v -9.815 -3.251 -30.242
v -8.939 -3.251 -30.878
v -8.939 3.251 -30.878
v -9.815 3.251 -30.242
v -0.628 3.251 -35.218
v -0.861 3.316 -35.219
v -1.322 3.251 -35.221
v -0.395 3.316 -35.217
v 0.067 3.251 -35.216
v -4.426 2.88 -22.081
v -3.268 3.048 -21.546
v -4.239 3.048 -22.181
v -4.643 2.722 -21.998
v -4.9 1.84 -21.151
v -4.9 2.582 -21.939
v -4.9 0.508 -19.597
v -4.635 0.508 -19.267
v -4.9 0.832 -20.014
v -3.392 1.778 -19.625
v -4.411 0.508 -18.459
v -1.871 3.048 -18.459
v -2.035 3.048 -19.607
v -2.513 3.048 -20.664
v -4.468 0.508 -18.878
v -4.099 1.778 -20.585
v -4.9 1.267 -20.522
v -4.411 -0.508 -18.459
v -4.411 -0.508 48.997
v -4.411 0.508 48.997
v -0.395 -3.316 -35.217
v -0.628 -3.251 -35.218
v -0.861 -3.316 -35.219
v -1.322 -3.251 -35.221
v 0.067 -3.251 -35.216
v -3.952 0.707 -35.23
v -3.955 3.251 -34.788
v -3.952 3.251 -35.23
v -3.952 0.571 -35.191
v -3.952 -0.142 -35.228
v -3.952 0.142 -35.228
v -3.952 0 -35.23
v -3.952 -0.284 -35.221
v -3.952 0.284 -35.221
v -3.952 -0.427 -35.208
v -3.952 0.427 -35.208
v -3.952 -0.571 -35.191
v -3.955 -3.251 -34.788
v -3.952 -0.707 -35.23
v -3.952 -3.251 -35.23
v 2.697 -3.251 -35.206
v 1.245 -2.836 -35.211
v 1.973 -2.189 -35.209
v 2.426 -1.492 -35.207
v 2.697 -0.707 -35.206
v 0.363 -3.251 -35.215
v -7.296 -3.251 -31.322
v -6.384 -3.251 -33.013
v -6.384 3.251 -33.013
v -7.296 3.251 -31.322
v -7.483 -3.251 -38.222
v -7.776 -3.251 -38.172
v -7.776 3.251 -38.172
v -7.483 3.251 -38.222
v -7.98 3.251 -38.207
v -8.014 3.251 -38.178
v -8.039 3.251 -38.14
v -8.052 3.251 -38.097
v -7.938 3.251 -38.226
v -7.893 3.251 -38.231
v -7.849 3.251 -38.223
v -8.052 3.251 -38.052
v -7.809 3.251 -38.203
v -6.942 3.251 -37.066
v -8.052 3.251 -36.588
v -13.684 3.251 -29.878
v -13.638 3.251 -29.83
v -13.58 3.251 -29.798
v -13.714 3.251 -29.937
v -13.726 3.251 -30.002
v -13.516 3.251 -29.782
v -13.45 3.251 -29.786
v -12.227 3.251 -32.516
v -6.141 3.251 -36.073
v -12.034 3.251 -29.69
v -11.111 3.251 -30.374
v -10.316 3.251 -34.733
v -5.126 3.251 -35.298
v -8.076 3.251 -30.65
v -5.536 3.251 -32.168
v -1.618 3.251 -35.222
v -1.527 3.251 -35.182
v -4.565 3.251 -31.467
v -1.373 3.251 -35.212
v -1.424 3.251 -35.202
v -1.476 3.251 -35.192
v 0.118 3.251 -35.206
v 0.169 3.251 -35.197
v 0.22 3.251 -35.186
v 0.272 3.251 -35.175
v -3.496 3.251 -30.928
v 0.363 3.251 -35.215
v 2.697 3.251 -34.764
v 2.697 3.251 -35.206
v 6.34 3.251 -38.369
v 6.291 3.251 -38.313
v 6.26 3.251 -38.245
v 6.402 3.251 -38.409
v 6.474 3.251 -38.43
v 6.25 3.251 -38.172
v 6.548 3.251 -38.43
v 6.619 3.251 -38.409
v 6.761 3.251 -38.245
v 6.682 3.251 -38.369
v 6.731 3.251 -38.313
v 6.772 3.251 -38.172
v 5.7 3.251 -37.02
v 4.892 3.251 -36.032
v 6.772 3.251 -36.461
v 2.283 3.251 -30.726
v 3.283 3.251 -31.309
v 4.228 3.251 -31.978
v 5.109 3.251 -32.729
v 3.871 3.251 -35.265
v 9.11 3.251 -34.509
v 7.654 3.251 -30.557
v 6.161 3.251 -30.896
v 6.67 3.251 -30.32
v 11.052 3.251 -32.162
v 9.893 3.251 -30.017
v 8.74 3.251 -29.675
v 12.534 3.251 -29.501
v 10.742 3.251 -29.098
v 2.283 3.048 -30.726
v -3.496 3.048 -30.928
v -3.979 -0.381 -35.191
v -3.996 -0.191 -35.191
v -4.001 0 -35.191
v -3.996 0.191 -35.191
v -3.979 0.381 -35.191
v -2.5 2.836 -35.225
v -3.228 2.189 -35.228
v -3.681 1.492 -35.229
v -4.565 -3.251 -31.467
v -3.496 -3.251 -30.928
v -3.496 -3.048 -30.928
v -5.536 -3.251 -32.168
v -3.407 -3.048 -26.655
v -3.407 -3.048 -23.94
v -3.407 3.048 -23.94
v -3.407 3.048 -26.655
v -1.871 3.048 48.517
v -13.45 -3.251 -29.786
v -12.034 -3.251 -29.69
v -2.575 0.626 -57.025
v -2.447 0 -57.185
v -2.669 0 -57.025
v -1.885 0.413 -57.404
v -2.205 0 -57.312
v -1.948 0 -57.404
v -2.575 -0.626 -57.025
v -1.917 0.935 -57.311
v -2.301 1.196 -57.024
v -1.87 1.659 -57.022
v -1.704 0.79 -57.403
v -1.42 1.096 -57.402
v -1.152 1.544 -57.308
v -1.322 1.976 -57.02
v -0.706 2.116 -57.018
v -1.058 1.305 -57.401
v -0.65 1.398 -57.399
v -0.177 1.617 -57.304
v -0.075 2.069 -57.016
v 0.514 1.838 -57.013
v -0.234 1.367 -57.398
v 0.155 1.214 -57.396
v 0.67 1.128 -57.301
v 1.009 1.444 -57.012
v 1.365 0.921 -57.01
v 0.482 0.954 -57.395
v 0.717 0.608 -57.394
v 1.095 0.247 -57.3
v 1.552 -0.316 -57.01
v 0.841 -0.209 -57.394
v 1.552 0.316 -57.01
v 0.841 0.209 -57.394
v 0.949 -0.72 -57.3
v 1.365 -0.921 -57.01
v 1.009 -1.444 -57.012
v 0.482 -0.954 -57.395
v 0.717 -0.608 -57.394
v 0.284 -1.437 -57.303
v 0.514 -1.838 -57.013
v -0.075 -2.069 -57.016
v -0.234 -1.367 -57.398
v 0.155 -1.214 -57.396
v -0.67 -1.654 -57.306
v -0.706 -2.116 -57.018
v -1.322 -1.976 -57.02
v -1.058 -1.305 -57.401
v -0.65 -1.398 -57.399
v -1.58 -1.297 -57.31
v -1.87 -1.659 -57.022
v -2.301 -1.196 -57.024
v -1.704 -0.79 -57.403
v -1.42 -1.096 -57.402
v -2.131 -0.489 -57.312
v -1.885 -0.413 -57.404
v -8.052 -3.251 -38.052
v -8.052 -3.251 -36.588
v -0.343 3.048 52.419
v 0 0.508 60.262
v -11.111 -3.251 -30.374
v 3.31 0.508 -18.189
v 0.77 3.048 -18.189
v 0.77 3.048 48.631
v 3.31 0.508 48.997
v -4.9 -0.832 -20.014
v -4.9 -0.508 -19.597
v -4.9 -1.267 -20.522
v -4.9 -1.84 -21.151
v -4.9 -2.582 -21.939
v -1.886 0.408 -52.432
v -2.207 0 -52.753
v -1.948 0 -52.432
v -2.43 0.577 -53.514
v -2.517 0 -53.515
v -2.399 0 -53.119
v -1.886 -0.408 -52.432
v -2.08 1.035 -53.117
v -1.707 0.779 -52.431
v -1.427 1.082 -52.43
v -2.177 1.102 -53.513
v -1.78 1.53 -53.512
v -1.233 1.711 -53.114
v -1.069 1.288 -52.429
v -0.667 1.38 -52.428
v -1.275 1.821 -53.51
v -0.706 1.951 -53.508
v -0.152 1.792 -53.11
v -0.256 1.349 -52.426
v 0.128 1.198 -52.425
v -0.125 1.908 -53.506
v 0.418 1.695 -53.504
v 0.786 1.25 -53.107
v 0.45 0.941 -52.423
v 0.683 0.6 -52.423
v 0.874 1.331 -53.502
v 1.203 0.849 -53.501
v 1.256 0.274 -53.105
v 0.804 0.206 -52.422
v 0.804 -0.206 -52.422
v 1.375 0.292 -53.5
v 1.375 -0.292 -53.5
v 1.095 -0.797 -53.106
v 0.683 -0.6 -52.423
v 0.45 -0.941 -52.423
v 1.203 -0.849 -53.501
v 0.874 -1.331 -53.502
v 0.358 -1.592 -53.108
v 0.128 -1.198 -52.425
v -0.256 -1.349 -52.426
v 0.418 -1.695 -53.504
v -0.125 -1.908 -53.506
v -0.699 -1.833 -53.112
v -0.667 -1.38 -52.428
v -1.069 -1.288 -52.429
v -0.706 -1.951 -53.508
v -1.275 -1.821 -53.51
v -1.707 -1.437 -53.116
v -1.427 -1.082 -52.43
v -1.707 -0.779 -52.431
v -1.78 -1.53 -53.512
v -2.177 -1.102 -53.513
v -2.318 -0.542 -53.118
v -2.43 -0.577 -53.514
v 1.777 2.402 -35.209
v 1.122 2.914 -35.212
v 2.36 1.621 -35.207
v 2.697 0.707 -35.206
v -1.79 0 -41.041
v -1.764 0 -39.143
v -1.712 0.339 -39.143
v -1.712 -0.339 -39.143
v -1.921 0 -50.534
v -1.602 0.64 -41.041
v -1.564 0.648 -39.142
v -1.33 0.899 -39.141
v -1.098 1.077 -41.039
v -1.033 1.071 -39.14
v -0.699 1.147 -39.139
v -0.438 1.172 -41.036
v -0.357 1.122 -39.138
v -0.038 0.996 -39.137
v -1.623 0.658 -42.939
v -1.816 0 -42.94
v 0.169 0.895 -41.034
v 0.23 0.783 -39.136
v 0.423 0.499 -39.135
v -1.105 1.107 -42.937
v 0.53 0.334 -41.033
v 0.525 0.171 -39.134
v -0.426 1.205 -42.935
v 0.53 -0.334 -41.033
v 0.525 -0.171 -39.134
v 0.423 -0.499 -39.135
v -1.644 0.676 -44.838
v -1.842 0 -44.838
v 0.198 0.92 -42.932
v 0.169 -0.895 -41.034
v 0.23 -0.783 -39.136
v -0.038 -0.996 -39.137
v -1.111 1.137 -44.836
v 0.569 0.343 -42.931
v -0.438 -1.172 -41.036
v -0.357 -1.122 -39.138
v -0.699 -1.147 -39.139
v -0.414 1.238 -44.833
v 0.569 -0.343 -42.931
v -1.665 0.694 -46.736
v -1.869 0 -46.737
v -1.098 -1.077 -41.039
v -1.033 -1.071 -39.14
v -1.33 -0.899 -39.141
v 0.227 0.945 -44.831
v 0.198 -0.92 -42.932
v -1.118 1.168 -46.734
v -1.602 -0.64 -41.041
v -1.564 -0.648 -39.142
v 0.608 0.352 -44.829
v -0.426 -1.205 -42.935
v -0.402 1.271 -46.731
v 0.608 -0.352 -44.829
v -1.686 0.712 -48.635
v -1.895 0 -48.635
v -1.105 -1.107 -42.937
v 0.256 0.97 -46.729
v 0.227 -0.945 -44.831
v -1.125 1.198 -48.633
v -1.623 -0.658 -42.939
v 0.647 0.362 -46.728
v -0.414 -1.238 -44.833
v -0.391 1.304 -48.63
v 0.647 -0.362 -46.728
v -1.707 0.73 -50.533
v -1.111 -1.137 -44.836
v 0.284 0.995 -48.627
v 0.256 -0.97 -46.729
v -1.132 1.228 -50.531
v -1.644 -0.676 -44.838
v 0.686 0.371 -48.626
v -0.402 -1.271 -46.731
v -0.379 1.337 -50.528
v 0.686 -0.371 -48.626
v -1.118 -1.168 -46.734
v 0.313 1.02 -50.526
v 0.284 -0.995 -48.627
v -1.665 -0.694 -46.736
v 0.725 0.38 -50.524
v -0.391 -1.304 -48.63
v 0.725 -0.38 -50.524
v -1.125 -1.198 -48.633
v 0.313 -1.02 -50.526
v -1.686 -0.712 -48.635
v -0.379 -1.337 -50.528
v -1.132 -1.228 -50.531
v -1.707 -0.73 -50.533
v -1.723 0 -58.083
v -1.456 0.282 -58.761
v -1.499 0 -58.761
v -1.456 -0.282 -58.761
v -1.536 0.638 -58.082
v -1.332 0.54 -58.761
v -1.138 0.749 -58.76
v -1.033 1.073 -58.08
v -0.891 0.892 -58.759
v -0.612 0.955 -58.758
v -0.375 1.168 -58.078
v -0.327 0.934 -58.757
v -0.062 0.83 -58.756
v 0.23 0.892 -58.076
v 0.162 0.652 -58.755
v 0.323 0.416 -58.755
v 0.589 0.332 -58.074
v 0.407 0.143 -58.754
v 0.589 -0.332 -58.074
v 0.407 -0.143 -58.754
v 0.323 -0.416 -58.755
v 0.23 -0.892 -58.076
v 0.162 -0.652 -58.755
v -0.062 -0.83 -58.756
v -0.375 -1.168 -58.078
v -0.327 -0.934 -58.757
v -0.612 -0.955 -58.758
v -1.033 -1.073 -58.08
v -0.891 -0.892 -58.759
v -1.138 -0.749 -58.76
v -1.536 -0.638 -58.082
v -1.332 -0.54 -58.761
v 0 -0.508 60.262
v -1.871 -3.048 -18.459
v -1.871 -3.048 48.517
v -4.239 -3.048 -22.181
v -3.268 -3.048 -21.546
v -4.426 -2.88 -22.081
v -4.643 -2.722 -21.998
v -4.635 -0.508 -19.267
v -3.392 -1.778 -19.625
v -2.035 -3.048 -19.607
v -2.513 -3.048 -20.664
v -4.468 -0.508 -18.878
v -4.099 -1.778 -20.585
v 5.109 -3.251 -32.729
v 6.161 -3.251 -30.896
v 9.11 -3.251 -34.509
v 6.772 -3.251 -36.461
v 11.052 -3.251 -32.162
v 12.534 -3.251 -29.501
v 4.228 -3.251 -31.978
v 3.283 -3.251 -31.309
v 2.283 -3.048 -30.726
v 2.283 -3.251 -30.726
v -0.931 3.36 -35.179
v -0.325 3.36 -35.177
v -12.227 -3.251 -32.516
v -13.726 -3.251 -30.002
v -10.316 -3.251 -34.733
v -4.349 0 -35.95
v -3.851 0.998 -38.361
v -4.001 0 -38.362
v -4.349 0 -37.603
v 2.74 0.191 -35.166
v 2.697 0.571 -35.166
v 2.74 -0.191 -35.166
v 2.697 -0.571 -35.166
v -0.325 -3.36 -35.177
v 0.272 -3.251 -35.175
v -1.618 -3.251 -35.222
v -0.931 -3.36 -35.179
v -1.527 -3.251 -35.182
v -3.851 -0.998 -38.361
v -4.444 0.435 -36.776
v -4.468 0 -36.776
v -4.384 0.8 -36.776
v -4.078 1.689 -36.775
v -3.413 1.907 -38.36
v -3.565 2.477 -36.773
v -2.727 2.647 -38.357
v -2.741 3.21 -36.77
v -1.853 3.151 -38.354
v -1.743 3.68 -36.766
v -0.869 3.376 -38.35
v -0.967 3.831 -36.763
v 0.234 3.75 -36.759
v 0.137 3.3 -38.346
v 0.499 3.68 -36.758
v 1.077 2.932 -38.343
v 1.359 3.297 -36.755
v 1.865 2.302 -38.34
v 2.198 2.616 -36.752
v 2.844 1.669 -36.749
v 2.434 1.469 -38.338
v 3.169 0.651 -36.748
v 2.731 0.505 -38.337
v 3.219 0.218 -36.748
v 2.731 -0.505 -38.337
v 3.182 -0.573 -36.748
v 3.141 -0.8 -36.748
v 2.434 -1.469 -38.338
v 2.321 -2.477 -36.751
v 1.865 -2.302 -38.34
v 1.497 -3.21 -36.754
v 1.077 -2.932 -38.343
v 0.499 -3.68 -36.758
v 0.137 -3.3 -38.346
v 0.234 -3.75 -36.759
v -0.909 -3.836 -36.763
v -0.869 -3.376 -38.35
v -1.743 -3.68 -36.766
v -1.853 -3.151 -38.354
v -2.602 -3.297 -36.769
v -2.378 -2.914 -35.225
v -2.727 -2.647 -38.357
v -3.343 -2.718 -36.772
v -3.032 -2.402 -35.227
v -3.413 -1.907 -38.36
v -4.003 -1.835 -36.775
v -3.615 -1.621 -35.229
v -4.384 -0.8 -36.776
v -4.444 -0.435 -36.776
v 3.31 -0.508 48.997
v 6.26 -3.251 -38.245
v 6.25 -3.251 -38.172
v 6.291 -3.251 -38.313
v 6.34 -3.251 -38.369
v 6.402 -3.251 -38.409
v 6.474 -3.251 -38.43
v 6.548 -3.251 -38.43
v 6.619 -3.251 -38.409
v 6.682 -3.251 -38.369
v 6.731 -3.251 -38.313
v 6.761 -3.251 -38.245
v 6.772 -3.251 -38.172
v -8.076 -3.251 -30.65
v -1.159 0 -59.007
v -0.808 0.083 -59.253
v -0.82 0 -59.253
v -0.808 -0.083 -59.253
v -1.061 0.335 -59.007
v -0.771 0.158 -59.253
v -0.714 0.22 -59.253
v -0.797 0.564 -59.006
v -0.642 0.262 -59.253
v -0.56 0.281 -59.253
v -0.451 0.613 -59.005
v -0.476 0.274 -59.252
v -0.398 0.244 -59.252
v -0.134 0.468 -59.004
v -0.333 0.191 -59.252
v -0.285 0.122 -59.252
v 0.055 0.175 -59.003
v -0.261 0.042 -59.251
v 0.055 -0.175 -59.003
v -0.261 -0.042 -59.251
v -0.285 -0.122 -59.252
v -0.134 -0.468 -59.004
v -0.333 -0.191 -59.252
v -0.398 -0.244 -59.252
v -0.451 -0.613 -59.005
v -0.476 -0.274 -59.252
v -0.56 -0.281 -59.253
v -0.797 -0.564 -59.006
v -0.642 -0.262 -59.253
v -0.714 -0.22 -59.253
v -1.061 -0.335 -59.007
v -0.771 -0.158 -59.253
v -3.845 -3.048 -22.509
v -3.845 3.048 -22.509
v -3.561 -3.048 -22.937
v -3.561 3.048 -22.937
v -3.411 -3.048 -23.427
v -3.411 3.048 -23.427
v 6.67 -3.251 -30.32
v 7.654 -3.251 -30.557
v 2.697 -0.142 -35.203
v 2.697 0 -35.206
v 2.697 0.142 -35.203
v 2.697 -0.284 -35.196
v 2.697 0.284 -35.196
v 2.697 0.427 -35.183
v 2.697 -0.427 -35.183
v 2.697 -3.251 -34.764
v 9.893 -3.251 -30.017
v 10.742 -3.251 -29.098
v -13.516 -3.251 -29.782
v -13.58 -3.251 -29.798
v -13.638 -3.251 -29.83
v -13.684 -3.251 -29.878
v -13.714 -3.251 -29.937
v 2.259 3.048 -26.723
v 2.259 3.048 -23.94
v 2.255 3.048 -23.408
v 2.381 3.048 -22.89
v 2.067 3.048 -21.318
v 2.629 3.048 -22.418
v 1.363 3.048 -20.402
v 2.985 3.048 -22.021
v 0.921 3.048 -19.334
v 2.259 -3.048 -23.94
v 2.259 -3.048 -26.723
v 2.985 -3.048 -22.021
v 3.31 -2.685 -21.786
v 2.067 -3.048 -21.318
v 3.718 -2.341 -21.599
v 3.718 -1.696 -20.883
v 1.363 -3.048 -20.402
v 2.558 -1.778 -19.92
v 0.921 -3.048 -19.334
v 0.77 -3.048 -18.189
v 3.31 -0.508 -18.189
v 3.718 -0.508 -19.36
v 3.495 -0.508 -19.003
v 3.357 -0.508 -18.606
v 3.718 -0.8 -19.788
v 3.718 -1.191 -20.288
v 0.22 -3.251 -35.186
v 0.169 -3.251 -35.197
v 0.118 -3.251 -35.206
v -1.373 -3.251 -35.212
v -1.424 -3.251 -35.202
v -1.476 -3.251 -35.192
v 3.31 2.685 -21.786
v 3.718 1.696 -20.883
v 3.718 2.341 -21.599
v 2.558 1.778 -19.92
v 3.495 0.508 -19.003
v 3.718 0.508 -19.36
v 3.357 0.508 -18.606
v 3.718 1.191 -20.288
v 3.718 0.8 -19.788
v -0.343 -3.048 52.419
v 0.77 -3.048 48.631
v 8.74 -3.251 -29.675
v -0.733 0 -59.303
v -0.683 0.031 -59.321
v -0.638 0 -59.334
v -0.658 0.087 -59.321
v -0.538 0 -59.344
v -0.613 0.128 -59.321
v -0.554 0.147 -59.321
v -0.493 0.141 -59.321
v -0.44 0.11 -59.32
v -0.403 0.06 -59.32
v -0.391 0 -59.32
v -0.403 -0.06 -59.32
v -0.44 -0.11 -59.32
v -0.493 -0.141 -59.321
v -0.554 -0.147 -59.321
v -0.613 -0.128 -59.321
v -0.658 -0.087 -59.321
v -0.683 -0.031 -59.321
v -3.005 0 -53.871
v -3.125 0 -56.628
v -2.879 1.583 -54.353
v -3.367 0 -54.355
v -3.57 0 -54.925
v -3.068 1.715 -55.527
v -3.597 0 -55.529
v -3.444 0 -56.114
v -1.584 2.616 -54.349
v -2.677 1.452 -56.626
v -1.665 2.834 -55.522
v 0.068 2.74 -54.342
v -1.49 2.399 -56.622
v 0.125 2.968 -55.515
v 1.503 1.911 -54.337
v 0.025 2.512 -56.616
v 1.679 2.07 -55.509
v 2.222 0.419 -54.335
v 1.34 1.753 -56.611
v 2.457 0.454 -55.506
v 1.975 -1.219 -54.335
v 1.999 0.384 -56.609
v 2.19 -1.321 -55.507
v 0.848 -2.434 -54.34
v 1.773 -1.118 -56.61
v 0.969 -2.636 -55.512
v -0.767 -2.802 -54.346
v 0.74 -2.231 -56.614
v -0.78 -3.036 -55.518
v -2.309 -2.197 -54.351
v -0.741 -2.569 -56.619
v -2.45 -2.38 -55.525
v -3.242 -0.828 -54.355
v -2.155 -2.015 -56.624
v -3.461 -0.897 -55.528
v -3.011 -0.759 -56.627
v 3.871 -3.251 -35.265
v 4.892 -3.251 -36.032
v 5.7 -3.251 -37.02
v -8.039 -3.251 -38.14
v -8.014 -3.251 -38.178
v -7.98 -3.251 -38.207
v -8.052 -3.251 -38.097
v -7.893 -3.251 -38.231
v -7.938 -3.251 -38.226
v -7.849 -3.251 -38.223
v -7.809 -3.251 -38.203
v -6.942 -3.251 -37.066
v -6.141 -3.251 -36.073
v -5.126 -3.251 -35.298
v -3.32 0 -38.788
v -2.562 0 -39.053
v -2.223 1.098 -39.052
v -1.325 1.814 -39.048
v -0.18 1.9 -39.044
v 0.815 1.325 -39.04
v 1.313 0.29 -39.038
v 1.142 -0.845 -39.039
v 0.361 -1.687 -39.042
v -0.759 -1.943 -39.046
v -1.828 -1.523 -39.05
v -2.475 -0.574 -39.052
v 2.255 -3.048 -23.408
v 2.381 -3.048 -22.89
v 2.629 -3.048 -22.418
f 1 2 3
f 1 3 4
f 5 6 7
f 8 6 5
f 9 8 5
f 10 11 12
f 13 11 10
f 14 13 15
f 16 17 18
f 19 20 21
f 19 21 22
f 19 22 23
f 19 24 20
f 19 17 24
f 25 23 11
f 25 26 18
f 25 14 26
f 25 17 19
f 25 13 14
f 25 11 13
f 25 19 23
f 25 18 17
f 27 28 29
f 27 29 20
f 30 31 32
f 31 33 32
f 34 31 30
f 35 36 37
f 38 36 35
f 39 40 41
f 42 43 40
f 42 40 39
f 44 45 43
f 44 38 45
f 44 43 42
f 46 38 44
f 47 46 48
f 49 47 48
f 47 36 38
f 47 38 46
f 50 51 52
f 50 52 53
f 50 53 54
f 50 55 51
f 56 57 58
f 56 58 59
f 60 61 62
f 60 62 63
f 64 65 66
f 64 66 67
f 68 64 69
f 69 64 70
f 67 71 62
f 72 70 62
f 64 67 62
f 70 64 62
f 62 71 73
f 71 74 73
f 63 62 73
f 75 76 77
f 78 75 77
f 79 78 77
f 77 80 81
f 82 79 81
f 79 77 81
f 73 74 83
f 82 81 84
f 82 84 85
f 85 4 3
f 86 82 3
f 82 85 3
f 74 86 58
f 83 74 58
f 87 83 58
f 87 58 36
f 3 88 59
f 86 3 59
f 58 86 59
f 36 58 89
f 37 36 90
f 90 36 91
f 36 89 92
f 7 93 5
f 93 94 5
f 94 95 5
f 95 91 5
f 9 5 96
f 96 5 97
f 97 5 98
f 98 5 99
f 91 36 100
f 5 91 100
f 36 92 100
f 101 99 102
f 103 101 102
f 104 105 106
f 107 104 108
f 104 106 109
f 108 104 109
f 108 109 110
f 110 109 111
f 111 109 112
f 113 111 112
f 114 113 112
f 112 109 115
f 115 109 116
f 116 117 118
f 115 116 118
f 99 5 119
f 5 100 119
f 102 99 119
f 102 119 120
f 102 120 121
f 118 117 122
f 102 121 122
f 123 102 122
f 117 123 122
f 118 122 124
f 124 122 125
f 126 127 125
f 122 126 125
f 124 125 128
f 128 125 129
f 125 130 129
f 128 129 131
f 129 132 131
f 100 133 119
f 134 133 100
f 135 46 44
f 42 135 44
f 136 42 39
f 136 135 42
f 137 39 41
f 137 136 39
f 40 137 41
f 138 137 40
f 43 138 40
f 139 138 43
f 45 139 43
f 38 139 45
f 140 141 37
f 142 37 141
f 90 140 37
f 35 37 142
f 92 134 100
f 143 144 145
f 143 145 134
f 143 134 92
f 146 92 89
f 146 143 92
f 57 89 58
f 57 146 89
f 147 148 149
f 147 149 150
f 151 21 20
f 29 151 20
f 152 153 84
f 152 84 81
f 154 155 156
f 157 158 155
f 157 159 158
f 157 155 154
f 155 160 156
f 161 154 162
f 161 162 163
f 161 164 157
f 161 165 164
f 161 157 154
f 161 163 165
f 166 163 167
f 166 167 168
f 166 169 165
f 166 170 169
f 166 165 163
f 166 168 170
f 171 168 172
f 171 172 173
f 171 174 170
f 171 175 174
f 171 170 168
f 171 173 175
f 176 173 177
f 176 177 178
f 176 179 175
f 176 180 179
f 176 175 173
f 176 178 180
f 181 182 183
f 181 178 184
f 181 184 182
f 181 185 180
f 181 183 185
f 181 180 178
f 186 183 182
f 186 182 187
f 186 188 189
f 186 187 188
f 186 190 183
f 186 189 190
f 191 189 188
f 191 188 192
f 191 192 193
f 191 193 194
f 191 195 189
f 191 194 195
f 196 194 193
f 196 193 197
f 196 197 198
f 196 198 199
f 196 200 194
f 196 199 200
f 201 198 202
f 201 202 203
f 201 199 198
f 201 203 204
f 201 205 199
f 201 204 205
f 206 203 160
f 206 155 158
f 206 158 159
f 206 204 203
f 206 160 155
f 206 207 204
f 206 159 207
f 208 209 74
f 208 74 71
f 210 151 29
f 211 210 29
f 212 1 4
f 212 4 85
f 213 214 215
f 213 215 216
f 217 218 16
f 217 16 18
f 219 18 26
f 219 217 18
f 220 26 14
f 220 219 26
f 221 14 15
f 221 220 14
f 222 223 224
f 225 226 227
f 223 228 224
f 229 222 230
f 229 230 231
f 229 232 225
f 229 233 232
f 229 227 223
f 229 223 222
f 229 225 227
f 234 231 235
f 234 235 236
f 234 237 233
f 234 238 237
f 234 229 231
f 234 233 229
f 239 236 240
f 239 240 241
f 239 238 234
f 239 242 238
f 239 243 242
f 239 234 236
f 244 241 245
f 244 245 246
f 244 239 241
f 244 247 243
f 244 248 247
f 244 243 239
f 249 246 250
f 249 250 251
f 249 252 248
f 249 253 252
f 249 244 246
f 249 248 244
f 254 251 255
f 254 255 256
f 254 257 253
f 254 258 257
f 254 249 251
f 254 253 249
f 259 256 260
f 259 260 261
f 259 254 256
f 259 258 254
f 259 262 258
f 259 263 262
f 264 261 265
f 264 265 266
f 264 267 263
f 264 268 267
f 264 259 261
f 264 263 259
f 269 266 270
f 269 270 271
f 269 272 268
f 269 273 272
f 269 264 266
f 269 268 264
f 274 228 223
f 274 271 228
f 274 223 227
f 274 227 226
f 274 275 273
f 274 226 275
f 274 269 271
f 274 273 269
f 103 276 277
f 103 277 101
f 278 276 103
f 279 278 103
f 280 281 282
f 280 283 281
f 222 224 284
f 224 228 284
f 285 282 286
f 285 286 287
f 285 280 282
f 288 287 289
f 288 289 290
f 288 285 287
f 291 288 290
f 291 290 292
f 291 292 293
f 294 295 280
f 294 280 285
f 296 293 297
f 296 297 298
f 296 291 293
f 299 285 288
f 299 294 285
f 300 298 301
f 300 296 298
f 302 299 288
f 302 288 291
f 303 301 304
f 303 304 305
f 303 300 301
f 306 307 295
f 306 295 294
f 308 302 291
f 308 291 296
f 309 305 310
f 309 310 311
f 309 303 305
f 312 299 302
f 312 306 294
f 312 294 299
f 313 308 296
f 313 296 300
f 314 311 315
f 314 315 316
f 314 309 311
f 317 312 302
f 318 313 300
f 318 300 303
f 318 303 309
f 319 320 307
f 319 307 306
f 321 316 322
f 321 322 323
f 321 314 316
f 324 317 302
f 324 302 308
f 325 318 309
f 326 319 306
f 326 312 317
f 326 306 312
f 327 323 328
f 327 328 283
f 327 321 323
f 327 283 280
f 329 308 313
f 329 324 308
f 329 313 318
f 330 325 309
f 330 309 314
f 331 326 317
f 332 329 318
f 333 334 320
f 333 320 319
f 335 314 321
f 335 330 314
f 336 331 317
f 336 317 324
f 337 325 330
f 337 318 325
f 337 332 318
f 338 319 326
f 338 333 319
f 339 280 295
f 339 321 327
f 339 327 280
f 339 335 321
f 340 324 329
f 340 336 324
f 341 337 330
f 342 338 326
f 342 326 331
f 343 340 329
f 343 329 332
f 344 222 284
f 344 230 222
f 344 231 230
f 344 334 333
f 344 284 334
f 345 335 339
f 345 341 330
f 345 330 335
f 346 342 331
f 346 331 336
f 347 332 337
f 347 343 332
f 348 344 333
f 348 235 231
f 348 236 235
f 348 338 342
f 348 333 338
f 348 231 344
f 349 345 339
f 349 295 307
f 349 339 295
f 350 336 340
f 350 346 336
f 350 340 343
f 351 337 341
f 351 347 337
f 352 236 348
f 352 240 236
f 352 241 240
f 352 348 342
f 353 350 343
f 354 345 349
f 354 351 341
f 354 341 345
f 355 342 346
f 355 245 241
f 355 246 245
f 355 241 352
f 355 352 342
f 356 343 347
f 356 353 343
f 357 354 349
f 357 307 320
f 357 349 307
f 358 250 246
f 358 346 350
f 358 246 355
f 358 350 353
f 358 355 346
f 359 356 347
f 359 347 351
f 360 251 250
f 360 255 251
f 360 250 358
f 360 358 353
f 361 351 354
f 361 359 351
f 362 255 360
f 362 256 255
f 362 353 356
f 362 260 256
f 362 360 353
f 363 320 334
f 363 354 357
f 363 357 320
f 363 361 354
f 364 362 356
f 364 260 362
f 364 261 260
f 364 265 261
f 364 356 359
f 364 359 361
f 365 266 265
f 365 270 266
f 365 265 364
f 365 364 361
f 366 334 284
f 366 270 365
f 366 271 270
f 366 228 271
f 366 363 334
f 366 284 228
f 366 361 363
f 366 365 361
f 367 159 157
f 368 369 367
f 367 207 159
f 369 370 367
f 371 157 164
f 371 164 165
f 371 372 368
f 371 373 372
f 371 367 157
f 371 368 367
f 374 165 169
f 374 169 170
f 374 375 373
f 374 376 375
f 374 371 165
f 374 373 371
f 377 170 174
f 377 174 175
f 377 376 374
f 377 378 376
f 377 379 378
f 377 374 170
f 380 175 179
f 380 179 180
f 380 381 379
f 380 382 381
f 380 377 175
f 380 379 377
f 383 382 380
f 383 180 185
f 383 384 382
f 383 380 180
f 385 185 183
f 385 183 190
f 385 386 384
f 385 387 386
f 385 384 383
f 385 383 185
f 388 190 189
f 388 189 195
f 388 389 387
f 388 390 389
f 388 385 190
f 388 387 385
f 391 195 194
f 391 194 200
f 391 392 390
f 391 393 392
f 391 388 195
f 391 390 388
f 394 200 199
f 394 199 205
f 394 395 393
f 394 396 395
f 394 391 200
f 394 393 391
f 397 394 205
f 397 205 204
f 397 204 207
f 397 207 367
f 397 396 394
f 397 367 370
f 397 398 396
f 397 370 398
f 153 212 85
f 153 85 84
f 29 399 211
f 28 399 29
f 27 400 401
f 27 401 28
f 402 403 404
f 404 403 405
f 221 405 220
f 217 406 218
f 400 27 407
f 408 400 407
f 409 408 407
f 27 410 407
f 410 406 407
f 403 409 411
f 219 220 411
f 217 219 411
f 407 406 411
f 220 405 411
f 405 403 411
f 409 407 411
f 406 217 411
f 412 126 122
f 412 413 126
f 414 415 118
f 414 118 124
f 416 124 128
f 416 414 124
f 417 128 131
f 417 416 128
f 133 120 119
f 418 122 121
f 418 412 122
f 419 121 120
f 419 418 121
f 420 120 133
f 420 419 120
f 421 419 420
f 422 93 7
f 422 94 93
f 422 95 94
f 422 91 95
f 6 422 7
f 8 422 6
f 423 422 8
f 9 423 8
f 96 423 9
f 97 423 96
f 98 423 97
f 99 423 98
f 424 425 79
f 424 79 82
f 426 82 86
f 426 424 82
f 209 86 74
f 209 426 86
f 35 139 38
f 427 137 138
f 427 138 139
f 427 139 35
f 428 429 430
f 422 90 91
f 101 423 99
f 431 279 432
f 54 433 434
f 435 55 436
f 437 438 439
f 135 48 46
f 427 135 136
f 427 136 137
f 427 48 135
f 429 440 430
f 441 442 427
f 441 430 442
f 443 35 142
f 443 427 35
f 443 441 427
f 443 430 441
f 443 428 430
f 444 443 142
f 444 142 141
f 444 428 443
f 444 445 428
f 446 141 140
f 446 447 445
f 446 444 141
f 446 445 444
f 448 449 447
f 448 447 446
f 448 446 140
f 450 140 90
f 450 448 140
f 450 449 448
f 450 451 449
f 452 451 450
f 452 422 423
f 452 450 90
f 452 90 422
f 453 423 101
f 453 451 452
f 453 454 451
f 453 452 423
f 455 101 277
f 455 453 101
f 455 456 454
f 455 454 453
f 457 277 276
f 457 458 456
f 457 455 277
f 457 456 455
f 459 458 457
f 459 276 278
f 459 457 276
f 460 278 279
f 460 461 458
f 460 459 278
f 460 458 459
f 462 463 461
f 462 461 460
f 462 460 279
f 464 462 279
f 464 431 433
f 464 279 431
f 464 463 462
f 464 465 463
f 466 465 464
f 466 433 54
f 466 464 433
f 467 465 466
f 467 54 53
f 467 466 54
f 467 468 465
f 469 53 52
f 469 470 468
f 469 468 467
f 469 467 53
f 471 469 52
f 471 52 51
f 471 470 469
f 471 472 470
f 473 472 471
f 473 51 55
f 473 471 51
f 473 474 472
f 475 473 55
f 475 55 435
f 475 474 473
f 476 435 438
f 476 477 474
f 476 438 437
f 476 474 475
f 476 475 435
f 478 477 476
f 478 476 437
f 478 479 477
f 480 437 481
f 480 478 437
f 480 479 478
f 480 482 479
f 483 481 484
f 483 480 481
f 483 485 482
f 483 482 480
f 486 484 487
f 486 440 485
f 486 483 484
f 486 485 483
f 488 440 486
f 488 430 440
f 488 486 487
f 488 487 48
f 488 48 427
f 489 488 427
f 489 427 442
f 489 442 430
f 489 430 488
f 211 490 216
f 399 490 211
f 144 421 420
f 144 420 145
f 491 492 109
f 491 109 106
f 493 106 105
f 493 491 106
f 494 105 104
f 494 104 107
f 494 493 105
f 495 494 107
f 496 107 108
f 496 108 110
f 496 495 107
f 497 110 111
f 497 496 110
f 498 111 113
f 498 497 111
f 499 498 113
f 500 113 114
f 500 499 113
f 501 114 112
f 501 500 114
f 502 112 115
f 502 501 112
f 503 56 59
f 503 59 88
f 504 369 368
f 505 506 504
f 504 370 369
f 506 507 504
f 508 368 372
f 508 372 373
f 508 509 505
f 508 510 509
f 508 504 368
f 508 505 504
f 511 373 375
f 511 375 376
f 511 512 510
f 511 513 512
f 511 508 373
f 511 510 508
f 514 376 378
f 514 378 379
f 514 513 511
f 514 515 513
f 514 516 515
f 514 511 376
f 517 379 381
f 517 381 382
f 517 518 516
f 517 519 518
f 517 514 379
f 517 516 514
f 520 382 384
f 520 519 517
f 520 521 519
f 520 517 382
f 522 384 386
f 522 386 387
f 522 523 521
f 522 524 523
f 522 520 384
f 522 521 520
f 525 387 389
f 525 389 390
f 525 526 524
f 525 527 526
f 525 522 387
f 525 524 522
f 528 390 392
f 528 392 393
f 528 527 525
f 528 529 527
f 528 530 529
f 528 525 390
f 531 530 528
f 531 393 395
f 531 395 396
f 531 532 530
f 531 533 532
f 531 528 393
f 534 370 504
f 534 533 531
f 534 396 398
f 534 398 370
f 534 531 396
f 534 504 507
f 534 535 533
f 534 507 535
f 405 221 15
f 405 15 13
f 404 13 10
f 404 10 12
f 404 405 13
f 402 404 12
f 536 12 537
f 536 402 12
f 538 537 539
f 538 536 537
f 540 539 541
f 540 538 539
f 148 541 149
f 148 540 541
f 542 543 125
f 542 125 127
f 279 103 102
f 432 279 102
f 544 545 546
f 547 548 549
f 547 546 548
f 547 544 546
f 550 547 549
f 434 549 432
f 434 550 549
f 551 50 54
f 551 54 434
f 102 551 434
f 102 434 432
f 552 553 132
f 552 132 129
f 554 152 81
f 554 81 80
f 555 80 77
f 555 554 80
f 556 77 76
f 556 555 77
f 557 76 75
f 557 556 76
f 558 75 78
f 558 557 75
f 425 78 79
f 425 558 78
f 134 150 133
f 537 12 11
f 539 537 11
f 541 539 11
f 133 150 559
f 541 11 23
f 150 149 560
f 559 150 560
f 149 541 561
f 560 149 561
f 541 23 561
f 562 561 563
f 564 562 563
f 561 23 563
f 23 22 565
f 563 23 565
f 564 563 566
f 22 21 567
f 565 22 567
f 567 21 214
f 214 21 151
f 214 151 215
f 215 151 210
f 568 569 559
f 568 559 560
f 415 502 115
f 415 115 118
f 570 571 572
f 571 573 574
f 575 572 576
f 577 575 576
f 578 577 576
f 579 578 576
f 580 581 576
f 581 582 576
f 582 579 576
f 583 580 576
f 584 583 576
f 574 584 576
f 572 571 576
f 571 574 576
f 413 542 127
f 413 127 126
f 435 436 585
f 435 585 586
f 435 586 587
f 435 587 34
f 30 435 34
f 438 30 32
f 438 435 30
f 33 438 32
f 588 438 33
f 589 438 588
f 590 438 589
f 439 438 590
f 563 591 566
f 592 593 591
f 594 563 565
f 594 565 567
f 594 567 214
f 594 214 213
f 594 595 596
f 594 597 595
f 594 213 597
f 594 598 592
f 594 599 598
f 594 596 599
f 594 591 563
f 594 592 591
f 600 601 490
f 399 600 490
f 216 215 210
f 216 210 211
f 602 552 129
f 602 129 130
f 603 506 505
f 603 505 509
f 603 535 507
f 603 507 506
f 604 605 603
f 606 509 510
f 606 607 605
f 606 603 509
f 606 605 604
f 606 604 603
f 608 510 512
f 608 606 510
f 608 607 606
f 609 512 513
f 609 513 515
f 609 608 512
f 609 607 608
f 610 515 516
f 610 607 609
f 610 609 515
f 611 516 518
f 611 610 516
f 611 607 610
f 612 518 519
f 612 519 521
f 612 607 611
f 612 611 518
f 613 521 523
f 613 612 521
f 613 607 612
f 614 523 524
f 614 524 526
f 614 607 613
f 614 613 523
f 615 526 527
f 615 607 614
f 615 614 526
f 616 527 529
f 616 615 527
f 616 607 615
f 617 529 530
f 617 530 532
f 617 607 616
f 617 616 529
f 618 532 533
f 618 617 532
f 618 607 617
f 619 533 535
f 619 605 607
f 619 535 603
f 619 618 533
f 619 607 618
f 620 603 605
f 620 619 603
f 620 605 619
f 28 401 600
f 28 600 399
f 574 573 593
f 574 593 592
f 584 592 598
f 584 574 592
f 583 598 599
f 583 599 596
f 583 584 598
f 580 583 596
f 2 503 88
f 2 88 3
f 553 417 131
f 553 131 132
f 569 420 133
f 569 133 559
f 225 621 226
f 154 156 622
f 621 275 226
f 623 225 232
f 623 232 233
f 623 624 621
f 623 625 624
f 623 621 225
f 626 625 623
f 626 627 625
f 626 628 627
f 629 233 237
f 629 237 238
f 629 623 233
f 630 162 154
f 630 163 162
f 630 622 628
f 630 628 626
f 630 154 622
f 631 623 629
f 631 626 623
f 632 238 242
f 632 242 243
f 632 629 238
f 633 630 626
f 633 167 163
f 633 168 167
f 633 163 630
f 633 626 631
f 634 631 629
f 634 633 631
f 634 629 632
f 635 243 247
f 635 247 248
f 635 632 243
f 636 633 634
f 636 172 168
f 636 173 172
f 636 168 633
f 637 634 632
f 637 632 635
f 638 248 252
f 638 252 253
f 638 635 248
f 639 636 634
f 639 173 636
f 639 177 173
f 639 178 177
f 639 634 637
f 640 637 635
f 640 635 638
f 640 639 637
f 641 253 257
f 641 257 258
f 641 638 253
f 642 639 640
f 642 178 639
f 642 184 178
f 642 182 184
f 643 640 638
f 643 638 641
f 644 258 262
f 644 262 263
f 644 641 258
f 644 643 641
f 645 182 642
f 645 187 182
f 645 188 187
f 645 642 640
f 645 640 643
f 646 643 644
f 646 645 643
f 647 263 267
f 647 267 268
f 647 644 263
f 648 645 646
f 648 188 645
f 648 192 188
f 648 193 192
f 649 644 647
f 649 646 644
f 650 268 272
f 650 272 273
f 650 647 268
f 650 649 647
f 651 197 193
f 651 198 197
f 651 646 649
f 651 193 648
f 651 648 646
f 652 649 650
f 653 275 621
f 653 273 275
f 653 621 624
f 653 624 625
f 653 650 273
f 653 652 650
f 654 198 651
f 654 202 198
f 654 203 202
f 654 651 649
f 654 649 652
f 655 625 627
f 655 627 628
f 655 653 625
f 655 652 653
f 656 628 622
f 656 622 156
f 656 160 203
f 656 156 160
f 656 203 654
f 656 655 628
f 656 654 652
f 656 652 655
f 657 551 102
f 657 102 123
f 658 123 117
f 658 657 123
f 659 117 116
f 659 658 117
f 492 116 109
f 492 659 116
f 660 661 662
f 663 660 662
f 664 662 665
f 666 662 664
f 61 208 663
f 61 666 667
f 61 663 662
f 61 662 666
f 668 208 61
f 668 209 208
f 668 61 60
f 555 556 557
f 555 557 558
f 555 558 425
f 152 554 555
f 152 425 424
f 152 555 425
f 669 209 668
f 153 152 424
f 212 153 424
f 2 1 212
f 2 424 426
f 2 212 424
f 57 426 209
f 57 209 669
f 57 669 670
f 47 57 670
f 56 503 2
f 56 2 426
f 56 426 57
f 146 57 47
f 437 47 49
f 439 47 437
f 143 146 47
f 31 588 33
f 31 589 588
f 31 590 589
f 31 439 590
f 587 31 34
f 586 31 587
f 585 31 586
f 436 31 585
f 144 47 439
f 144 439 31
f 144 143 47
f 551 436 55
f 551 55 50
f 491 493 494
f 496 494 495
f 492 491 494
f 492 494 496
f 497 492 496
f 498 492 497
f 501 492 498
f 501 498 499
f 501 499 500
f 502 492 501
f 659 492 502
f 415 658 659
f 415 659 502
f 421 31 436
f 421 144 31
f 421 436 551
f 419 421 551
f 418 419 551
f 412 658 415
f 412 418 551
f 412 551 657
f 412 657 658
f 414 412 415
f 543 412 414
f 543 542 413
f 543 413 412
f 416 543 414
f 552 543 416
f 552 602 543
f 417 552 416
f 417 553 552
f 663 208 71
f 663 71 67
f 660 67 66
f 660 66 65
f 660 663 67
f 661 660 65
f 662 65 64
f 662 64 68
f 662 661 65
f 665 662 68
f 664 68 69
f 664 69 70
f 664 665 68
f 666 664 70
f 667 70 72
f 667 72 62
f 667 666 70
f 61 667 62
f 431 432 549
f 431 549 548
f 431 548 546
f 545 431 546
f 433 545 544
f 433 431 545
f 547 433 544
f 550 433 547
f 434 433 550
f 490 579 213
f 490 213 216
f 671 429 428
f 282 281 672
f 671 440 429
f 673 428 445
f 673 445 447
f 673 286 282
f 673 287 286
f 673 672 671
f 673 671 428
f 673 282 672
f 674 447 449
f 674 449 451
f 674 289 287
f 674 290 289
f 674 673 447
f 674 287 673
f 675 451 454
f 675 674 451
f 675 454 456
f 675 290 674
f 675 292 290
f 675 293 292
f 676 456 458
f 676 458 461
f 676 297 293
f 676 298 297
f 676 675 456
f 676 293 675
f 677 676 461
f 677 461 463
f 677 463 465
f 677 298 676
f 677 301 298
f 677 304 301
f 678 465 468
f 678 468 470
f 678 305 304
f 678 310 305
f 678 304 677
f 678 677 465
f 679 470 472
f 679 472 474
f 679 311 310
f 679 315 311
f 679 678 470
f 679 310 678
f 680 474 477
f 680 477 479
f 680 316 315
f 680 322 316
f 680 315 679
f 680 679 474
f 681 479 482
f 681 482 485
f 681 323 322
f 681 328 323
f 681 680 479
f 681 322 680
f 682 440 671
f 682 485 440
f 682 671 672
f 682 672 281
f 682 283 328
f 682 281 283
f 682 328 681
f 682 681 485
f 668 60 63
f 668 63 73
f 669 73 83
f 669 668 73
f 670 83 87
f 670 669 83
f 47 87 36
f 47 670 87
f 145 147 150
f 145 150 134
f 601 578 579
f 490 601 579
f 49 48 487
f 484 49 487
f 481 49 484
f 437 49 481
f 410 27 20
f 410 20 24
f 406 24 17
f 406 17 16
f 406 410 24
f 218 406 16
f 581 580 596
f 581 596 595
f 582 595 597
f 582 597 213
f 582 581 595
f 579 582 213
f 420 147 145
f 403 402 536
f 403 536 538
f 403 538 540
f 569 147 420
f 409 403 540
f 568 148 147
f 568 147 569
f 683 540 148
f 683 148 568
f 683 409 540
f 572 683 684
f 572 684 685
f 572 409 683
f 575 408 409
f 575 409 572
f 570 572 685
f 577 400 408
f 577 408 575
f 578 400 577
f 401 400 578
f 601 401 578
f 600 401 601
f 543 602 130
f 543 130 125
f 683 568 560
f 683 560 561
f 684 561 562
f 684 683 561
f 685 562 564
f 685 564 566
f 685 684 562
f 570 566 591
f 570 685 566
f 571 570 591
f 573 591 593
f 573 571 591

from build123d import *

# Parameters (mm, degrees)
F2_DEPTH     = 3.2512
F3_DEPTH     = 3.048
F4_T1_DEPTH  = 29.734621701
F4_T3_DEPTH  = 78.5599474126
F4_T5_DEPTH  = 29.3779460523
F4_T7_DEPTH  = 78.2899783824
F4_T10_ANGLE = 237.1999890444
F4_T12_ANGLE = 237.1999890444
F4_T14_ANGLE = 359.64
F4_T16_ANGLE = 359.64


# Not quite as in the source:
# - a fillet or chamfer that OpenCascade refuses, or shapes differently, is made with other operations: its cross-section is extruded or revolved along the edge and cut away or added


with BuildPart() as f1:
    # F0 (on Front) → F1 (revolve)
    with BuildSketch(Plane.XZ):
        with BuildLine():
            Line((-0.6275566491, -35.2181914225), (-3.9520729807, -35.2304723177))
            Line((-3.9520729807, -35.2304723177), (-4.0009869263, -35.190757364))
            ThreePointArc((-4.0009869263, -35.190757364), (-4.468403987, -36.7762535495), (-4.0009869263, -38.361749735))
            ThreePointArc((-4.0009869263, -38.361749735), (-2.9483659374, -38.9416202329), (-1.7635652912, -39.1428866466))
            Line((-1.7635652912, -39.1428866466), (-1.9475727458, -52.4323270698))
            Line((-1.9475727458, -52.4323270698), (-0.5639669494, -52.4323270698))
            Line((-0.5639669494, -52.4323270698), (-0.6275566491, -35.2181914225))
        make_face()
        with BuildLine():
            Line((-0.540195615, -58.8673782805), (-0.5639669494, -52.4323270698))
            Line((-0.5639669494, -52.4323270698), (-1.9475727458, -52.4323270698))
            ThreePointArc((-1.9475727458, -52.4323270698), (-2.3123844436, -52.9312298771), (-2.5166937266, -53.5145388027))
            ThreePointArc((-2.5166937266, -53.5145388027), (-3.6060607732, -55.2257600565), (-2.6693845284, -57.0251033684))
            ThreePointArc((-2.6693845284, -57.0251033684), (-2.3283302078, -57.2524646389), (-1.9475727458, -57.4042373379))
            Line((-1.9475727458, -57.4042373379), (-1.4987547765, -58.7614909788))
            Line((-1.4987547765, -58.7614909788), (-0.820128771, -59.2534937938))
            ThreePointArc((-0.820128771, -59.2534937938), (-0.6865028844, -59.3212967141), (-0.5384338847, -59.3442898632))
            Line((-0.5384338847, -59.3442898632), (-0.540195615, -58.8673782805))
        make_face()
    revolve(axis=Axis((-0.5851411479, 0, -46.7003370305), (0.0036940145, 0, -0.9999931771)))

    # F0 (on Front) → F2 (join, symmetric)
    with BuildSketch(Plane.XZ):
        with BuildLine():
            Line((2.2831694857, -30.7255659779), (-3.495863406, -30.9279132634))
            ThreePointArc((-3.495863406, -30.9279132634), (-5.0646851839, -31.7977900116), (-6.3840295188, -33.0131985247))
            Line((-6.3840295188, -33.0131985247), (-7.2957654484, -31.3216894865))
            Line((-7.2957654484, -31.3216894865), (-8.075539954, -30.6498836726))
            Line((-8.075539954, -30.6498836726), (-8.9392894879, -30.8778174222))
            Line((-8.9392894879, -30.8778174222), (-9.8150353879, -30.2420016378))
            Line((-9.8150353879, -30.2420016378), (-11.11066062, -30.3739625961))
            Line((-11.11066062, -30.3739625961), (-12.0343929157, -29.6901613474))
            Line((-12.0343929157, -29.6901613474), (-13.4499836713, -29.7861322761))
            ThreePointArc((-13.4499836713, -29.7861322761), (-13.6378178947, -29.8303732109), (-13.7259028852, -30.0020705909))
            ThreePointArc((-13.7259028852, -30.0020705909), (-11.3193803546, -33.6661550155), (-8.0515462905, -36.5881621838))
            Line((-8.0515462905, -36.5881621838), (-8.0515462905, -38.0517393351))
            ThreePointArc((-8.0515462905, -38.0517393351), (-7.9598069948, -38.2180289535), (-7.775626611, -38.1717048585))
            Line((-7.775626611, -38.1717048585), (-7.4828979958, -38.2224339632))
            ThreePointArc((-7.4828979958, -38.2224339632), (-6.1405359903, -36.0725037485), (-3.9553394628, -34.7883496227))
            Line((-3.9553394628, -34.7883496227), (-3.9520729807, -35.2304723177))
            Line((-3.9520729807, -35.2304723177), (-0.6275566491, -35.2181914225))
            Line((-0.6275566491, -35.2181914225), (2.6969596825, -35.2059105274))
            Line((2.6969596825, -35.2059105274), (2.6969596825, -34.7637757659))
            ThreePointArc((2.6969596825, -34.7637757659), (4.8915838758, -36.0317506602), (6.2497928845, -38.1717048585))
            ThreePointArc((6.2497928845, -38.1717048585), (6.5108954494, -38.4328074234), (6.7719980143, -38.1717048585))
            Line((6.7719980143, -38.1717048585), (6.7719980143, -36.4611186087))
            ThreePointArc((6.7719980143, -36.4611186087), (10.1347132538, -33.3799368553), (12.5336479489, -29.500936068))
            Line((12.5336479489, -29.500936068), (10.7419602573, -29.0980264544))
            Line((10.7419602573, -29.0980264544), (9.8929585313, -30.0165999209))
            Line((9.8929585313, -30.0165999209), (8.7400143966, -29.6748578548))
            Line((8.7400143966, -29.6748578548), (7.6542128809, -30.5570717901))
            Line((7.6542128809, -30.5570717901), (6.6702044569, -30.3195528686))
            Line((6.6702044569, -30.3195528686), (6.1612352729, -30.8963861316))
            Line((6.1612352729, -30.8963861316), (5.1093655638, -32.7286757529))
            ThreePointArc((5.1093655638, -32.7286757529), (3.7630618873, -31.6328804159), (2.2831694857, -30.7255659779))
        make_face()
    extrude(amount=F2_DEPTH, both=True)

    # F0 (on Front) → F3 (join, symmetric)
    with BuildSketch(Plane.XZ):
        with BuildLine():
            Line((-4.411068745, 48.9967949688), (-4.411068745, -18.4586253017))
            ThreePointArc((-4.411068745, -18.4586253017), (-4.5385726522, -19.078284844), (-4.9003679305, -19.5972640067))
            Line((-4.9003679305, -19.5972640067), (-4.9003679305, -21.9385232776))
            ThreePointArc((-4.9003679305, -21.9385232776), (-3.7434702801, -22.6334289507), (-3.4073905554, -23.9404700696))
            Line((-3.4073905554, -23.9404700696), (-3.4073905554, -26.6549736261))
            Line((-3.4073905554, -26.6549736261), (-3.495863406, -30.9279132634))
            Line((-3.495863406, -30.9279132634), (2.2831694857, -30.7255659779))
            Line((2.2831694857, -30.7255659779), (2.2591357119, -26.7228353769))
            Line((2.2591357119, -26.7228353769), (2.2591357119, -23.9404700696))
            ThreePointArc((2.2591357119, -23.9404700696), (2.5697152514, -22.5087595302), (3.7181819789, -21.5992107987))
            Line((3.7181819789, -21.5992107987), (3.7181819789, -19.3597450852))
            ThreePointArc((3.7181819789, -19.3597450852), (3.4148052065, -18.8087864436), (3.3097744472, -18.1886562715))
            Line((3.3097744472, -18.1886562715), (3.3097744472, 48.9967949688))
            Line((3.3097744472, 48.9967949688), (0, 60.2619871497))
            Line((0, 60.2619871497), (-4.411068745, 48.9967949688))
        make_face()
    extrude(amount=F3_DEPTH, both=True)

    # F4: chamfer of 2.54 on 8 edges, made by hand

    # F4_s2 → F4_t1 (cut)
    with BuildSketch(Plane(origin=(22.8412726569, 0, 58.3331027043), x_dir=(0, 1, 0), z_dir=(-0.3646108065, 0, -0.9311600076))):
        Polygon((3.048, -19.4321717346), (0.508, -21.9721717346), (3.048, -21.9721717346), align=None)
        Polygon((-3.048, -19.4321717346), (-0.508, -21.9721717346), (-3.048, -21.9721717346), align=None)
    extrude(amount=F4_T1_DEPTH, mode=Mode.SUBTRACT)

    # F4_s4 → F4_t3 (cut)
    with BuildSketch(Plane.XY.offset(-18.4586253017)):
        Polygon((-1.871068745, -3.048), (-4.411068745, -0.508), (-4.411068745, -3.048), align=None)
        Polygon((-1.871068745, 3.048), (-4.411068745, 0.508), (-4.411068745, 3.048), align=None)
    extrude(amount=F4_T3_DEPTH, mode=Mode.SUBTRACT)

    # F4_s6 → F4_t5 (cut)
    with BuildSketch(Plane(origin=(-9.8583580644, 0, 33.5540381846), x_dir=(0, 1, 0), z_dir=(-0.2818905922, 0, 0.9594465561))):
        Polygon((3.048, -14.4472872435), (0.508, -16.9872872435), (3.048, -16.9872872435), align=None)
        Polygon((-3.048, -14.4472872435), (-0.508, -16.9872872435), (-3.048, -16.9872872435), align=None)
    extrude(amount=F4_T5_DEPTH, mode=Mode.SUBTRACT)

    # F4_s8 → F4_t7 (cut)
    with BuildSketch(Plane.XY.offset(-18.1886562715)):
        Polygon((0.7697744472, 3.048), (3.3097744472, 0.508), (3.3097744472, 3.048), align=None)
        Polygon((0.7697744472, -3.048), (3.3097744472, -0.508), (3.3097744472, -3.048), align=None)
    extrude(amount=F4_T7_DEPTH, mode=Mode.SUBTRACT)

    # F4_s9 → F4_t10 (revolve, cut)
    with BuildSketch(Plane(origin=(11.9511811184, 0, -7.702013887), x_dir=(0, 1, 0), z_dir=(-0.8405664999, 0, 0.541708371))):
        Polygon((-3.048, 8.0524604286), (-0.508, 10.5924604286), (-3.048, 10.5924604286), align=None)
    revolve(axis=Axis((5.1929984357, -3.048, -18.1886562715), (0, 1, 0)), revolution_arc=F4_T10_ANGLE, mode=Mode.SUBTRACT)

    # F4_s11 → F4_t12 (revolve, cut)
    with BuildSketch(Plane(origin=(11.9511811184, 0, -7.702013887), x_dir=(0, 1, 0), z_dir=(-0.8405664999, 0, 0.541708371))):
        Polygon((3.048, 8.0524604286), (0.508, 10.5924604286), (3.048, 10.5924604286), align=None)
    revolve(axis=Axis((5.1929984357, 3.048, -18.1886562715), (0, 1, 0)), revolution_arc=F4_T12_ANGLE, mode=Mode.SUBTRACT)

    # F4_s13 → F4_t14 (revolve, cut)
    with BuildSketch(Plane.XY.offset(-18.4586253017)):
        Polygon((-1.871068745, 3.048), (-4.411068745, 0.508), (-4.411068745, 3.048), align=None)
    revolve(axis=Axis((-5.9805704311, 3.048, -18.4586253017), (0, 1, 0)), revolution_arc=F4_T14_ANGLE, mode=Mode.SUBTRACT)

    # F4_s15 → F4_t16 (revolve, cut)
    with BuildSketch(Plane.XY.offset(-18.4586253017)):
        Polygon((-1.871068745, -3.048), (-4.411068745, -0.508), (-4.411068745, -3.048), align=None)
    revolve(axis=Axis((-5.9805704311, -3.048, -18.4586253017), (0, 1, 0)), revolution_arc=F4_T16_ANGLE, mode=Mode.SUBTRACT)


solid = f1.part
